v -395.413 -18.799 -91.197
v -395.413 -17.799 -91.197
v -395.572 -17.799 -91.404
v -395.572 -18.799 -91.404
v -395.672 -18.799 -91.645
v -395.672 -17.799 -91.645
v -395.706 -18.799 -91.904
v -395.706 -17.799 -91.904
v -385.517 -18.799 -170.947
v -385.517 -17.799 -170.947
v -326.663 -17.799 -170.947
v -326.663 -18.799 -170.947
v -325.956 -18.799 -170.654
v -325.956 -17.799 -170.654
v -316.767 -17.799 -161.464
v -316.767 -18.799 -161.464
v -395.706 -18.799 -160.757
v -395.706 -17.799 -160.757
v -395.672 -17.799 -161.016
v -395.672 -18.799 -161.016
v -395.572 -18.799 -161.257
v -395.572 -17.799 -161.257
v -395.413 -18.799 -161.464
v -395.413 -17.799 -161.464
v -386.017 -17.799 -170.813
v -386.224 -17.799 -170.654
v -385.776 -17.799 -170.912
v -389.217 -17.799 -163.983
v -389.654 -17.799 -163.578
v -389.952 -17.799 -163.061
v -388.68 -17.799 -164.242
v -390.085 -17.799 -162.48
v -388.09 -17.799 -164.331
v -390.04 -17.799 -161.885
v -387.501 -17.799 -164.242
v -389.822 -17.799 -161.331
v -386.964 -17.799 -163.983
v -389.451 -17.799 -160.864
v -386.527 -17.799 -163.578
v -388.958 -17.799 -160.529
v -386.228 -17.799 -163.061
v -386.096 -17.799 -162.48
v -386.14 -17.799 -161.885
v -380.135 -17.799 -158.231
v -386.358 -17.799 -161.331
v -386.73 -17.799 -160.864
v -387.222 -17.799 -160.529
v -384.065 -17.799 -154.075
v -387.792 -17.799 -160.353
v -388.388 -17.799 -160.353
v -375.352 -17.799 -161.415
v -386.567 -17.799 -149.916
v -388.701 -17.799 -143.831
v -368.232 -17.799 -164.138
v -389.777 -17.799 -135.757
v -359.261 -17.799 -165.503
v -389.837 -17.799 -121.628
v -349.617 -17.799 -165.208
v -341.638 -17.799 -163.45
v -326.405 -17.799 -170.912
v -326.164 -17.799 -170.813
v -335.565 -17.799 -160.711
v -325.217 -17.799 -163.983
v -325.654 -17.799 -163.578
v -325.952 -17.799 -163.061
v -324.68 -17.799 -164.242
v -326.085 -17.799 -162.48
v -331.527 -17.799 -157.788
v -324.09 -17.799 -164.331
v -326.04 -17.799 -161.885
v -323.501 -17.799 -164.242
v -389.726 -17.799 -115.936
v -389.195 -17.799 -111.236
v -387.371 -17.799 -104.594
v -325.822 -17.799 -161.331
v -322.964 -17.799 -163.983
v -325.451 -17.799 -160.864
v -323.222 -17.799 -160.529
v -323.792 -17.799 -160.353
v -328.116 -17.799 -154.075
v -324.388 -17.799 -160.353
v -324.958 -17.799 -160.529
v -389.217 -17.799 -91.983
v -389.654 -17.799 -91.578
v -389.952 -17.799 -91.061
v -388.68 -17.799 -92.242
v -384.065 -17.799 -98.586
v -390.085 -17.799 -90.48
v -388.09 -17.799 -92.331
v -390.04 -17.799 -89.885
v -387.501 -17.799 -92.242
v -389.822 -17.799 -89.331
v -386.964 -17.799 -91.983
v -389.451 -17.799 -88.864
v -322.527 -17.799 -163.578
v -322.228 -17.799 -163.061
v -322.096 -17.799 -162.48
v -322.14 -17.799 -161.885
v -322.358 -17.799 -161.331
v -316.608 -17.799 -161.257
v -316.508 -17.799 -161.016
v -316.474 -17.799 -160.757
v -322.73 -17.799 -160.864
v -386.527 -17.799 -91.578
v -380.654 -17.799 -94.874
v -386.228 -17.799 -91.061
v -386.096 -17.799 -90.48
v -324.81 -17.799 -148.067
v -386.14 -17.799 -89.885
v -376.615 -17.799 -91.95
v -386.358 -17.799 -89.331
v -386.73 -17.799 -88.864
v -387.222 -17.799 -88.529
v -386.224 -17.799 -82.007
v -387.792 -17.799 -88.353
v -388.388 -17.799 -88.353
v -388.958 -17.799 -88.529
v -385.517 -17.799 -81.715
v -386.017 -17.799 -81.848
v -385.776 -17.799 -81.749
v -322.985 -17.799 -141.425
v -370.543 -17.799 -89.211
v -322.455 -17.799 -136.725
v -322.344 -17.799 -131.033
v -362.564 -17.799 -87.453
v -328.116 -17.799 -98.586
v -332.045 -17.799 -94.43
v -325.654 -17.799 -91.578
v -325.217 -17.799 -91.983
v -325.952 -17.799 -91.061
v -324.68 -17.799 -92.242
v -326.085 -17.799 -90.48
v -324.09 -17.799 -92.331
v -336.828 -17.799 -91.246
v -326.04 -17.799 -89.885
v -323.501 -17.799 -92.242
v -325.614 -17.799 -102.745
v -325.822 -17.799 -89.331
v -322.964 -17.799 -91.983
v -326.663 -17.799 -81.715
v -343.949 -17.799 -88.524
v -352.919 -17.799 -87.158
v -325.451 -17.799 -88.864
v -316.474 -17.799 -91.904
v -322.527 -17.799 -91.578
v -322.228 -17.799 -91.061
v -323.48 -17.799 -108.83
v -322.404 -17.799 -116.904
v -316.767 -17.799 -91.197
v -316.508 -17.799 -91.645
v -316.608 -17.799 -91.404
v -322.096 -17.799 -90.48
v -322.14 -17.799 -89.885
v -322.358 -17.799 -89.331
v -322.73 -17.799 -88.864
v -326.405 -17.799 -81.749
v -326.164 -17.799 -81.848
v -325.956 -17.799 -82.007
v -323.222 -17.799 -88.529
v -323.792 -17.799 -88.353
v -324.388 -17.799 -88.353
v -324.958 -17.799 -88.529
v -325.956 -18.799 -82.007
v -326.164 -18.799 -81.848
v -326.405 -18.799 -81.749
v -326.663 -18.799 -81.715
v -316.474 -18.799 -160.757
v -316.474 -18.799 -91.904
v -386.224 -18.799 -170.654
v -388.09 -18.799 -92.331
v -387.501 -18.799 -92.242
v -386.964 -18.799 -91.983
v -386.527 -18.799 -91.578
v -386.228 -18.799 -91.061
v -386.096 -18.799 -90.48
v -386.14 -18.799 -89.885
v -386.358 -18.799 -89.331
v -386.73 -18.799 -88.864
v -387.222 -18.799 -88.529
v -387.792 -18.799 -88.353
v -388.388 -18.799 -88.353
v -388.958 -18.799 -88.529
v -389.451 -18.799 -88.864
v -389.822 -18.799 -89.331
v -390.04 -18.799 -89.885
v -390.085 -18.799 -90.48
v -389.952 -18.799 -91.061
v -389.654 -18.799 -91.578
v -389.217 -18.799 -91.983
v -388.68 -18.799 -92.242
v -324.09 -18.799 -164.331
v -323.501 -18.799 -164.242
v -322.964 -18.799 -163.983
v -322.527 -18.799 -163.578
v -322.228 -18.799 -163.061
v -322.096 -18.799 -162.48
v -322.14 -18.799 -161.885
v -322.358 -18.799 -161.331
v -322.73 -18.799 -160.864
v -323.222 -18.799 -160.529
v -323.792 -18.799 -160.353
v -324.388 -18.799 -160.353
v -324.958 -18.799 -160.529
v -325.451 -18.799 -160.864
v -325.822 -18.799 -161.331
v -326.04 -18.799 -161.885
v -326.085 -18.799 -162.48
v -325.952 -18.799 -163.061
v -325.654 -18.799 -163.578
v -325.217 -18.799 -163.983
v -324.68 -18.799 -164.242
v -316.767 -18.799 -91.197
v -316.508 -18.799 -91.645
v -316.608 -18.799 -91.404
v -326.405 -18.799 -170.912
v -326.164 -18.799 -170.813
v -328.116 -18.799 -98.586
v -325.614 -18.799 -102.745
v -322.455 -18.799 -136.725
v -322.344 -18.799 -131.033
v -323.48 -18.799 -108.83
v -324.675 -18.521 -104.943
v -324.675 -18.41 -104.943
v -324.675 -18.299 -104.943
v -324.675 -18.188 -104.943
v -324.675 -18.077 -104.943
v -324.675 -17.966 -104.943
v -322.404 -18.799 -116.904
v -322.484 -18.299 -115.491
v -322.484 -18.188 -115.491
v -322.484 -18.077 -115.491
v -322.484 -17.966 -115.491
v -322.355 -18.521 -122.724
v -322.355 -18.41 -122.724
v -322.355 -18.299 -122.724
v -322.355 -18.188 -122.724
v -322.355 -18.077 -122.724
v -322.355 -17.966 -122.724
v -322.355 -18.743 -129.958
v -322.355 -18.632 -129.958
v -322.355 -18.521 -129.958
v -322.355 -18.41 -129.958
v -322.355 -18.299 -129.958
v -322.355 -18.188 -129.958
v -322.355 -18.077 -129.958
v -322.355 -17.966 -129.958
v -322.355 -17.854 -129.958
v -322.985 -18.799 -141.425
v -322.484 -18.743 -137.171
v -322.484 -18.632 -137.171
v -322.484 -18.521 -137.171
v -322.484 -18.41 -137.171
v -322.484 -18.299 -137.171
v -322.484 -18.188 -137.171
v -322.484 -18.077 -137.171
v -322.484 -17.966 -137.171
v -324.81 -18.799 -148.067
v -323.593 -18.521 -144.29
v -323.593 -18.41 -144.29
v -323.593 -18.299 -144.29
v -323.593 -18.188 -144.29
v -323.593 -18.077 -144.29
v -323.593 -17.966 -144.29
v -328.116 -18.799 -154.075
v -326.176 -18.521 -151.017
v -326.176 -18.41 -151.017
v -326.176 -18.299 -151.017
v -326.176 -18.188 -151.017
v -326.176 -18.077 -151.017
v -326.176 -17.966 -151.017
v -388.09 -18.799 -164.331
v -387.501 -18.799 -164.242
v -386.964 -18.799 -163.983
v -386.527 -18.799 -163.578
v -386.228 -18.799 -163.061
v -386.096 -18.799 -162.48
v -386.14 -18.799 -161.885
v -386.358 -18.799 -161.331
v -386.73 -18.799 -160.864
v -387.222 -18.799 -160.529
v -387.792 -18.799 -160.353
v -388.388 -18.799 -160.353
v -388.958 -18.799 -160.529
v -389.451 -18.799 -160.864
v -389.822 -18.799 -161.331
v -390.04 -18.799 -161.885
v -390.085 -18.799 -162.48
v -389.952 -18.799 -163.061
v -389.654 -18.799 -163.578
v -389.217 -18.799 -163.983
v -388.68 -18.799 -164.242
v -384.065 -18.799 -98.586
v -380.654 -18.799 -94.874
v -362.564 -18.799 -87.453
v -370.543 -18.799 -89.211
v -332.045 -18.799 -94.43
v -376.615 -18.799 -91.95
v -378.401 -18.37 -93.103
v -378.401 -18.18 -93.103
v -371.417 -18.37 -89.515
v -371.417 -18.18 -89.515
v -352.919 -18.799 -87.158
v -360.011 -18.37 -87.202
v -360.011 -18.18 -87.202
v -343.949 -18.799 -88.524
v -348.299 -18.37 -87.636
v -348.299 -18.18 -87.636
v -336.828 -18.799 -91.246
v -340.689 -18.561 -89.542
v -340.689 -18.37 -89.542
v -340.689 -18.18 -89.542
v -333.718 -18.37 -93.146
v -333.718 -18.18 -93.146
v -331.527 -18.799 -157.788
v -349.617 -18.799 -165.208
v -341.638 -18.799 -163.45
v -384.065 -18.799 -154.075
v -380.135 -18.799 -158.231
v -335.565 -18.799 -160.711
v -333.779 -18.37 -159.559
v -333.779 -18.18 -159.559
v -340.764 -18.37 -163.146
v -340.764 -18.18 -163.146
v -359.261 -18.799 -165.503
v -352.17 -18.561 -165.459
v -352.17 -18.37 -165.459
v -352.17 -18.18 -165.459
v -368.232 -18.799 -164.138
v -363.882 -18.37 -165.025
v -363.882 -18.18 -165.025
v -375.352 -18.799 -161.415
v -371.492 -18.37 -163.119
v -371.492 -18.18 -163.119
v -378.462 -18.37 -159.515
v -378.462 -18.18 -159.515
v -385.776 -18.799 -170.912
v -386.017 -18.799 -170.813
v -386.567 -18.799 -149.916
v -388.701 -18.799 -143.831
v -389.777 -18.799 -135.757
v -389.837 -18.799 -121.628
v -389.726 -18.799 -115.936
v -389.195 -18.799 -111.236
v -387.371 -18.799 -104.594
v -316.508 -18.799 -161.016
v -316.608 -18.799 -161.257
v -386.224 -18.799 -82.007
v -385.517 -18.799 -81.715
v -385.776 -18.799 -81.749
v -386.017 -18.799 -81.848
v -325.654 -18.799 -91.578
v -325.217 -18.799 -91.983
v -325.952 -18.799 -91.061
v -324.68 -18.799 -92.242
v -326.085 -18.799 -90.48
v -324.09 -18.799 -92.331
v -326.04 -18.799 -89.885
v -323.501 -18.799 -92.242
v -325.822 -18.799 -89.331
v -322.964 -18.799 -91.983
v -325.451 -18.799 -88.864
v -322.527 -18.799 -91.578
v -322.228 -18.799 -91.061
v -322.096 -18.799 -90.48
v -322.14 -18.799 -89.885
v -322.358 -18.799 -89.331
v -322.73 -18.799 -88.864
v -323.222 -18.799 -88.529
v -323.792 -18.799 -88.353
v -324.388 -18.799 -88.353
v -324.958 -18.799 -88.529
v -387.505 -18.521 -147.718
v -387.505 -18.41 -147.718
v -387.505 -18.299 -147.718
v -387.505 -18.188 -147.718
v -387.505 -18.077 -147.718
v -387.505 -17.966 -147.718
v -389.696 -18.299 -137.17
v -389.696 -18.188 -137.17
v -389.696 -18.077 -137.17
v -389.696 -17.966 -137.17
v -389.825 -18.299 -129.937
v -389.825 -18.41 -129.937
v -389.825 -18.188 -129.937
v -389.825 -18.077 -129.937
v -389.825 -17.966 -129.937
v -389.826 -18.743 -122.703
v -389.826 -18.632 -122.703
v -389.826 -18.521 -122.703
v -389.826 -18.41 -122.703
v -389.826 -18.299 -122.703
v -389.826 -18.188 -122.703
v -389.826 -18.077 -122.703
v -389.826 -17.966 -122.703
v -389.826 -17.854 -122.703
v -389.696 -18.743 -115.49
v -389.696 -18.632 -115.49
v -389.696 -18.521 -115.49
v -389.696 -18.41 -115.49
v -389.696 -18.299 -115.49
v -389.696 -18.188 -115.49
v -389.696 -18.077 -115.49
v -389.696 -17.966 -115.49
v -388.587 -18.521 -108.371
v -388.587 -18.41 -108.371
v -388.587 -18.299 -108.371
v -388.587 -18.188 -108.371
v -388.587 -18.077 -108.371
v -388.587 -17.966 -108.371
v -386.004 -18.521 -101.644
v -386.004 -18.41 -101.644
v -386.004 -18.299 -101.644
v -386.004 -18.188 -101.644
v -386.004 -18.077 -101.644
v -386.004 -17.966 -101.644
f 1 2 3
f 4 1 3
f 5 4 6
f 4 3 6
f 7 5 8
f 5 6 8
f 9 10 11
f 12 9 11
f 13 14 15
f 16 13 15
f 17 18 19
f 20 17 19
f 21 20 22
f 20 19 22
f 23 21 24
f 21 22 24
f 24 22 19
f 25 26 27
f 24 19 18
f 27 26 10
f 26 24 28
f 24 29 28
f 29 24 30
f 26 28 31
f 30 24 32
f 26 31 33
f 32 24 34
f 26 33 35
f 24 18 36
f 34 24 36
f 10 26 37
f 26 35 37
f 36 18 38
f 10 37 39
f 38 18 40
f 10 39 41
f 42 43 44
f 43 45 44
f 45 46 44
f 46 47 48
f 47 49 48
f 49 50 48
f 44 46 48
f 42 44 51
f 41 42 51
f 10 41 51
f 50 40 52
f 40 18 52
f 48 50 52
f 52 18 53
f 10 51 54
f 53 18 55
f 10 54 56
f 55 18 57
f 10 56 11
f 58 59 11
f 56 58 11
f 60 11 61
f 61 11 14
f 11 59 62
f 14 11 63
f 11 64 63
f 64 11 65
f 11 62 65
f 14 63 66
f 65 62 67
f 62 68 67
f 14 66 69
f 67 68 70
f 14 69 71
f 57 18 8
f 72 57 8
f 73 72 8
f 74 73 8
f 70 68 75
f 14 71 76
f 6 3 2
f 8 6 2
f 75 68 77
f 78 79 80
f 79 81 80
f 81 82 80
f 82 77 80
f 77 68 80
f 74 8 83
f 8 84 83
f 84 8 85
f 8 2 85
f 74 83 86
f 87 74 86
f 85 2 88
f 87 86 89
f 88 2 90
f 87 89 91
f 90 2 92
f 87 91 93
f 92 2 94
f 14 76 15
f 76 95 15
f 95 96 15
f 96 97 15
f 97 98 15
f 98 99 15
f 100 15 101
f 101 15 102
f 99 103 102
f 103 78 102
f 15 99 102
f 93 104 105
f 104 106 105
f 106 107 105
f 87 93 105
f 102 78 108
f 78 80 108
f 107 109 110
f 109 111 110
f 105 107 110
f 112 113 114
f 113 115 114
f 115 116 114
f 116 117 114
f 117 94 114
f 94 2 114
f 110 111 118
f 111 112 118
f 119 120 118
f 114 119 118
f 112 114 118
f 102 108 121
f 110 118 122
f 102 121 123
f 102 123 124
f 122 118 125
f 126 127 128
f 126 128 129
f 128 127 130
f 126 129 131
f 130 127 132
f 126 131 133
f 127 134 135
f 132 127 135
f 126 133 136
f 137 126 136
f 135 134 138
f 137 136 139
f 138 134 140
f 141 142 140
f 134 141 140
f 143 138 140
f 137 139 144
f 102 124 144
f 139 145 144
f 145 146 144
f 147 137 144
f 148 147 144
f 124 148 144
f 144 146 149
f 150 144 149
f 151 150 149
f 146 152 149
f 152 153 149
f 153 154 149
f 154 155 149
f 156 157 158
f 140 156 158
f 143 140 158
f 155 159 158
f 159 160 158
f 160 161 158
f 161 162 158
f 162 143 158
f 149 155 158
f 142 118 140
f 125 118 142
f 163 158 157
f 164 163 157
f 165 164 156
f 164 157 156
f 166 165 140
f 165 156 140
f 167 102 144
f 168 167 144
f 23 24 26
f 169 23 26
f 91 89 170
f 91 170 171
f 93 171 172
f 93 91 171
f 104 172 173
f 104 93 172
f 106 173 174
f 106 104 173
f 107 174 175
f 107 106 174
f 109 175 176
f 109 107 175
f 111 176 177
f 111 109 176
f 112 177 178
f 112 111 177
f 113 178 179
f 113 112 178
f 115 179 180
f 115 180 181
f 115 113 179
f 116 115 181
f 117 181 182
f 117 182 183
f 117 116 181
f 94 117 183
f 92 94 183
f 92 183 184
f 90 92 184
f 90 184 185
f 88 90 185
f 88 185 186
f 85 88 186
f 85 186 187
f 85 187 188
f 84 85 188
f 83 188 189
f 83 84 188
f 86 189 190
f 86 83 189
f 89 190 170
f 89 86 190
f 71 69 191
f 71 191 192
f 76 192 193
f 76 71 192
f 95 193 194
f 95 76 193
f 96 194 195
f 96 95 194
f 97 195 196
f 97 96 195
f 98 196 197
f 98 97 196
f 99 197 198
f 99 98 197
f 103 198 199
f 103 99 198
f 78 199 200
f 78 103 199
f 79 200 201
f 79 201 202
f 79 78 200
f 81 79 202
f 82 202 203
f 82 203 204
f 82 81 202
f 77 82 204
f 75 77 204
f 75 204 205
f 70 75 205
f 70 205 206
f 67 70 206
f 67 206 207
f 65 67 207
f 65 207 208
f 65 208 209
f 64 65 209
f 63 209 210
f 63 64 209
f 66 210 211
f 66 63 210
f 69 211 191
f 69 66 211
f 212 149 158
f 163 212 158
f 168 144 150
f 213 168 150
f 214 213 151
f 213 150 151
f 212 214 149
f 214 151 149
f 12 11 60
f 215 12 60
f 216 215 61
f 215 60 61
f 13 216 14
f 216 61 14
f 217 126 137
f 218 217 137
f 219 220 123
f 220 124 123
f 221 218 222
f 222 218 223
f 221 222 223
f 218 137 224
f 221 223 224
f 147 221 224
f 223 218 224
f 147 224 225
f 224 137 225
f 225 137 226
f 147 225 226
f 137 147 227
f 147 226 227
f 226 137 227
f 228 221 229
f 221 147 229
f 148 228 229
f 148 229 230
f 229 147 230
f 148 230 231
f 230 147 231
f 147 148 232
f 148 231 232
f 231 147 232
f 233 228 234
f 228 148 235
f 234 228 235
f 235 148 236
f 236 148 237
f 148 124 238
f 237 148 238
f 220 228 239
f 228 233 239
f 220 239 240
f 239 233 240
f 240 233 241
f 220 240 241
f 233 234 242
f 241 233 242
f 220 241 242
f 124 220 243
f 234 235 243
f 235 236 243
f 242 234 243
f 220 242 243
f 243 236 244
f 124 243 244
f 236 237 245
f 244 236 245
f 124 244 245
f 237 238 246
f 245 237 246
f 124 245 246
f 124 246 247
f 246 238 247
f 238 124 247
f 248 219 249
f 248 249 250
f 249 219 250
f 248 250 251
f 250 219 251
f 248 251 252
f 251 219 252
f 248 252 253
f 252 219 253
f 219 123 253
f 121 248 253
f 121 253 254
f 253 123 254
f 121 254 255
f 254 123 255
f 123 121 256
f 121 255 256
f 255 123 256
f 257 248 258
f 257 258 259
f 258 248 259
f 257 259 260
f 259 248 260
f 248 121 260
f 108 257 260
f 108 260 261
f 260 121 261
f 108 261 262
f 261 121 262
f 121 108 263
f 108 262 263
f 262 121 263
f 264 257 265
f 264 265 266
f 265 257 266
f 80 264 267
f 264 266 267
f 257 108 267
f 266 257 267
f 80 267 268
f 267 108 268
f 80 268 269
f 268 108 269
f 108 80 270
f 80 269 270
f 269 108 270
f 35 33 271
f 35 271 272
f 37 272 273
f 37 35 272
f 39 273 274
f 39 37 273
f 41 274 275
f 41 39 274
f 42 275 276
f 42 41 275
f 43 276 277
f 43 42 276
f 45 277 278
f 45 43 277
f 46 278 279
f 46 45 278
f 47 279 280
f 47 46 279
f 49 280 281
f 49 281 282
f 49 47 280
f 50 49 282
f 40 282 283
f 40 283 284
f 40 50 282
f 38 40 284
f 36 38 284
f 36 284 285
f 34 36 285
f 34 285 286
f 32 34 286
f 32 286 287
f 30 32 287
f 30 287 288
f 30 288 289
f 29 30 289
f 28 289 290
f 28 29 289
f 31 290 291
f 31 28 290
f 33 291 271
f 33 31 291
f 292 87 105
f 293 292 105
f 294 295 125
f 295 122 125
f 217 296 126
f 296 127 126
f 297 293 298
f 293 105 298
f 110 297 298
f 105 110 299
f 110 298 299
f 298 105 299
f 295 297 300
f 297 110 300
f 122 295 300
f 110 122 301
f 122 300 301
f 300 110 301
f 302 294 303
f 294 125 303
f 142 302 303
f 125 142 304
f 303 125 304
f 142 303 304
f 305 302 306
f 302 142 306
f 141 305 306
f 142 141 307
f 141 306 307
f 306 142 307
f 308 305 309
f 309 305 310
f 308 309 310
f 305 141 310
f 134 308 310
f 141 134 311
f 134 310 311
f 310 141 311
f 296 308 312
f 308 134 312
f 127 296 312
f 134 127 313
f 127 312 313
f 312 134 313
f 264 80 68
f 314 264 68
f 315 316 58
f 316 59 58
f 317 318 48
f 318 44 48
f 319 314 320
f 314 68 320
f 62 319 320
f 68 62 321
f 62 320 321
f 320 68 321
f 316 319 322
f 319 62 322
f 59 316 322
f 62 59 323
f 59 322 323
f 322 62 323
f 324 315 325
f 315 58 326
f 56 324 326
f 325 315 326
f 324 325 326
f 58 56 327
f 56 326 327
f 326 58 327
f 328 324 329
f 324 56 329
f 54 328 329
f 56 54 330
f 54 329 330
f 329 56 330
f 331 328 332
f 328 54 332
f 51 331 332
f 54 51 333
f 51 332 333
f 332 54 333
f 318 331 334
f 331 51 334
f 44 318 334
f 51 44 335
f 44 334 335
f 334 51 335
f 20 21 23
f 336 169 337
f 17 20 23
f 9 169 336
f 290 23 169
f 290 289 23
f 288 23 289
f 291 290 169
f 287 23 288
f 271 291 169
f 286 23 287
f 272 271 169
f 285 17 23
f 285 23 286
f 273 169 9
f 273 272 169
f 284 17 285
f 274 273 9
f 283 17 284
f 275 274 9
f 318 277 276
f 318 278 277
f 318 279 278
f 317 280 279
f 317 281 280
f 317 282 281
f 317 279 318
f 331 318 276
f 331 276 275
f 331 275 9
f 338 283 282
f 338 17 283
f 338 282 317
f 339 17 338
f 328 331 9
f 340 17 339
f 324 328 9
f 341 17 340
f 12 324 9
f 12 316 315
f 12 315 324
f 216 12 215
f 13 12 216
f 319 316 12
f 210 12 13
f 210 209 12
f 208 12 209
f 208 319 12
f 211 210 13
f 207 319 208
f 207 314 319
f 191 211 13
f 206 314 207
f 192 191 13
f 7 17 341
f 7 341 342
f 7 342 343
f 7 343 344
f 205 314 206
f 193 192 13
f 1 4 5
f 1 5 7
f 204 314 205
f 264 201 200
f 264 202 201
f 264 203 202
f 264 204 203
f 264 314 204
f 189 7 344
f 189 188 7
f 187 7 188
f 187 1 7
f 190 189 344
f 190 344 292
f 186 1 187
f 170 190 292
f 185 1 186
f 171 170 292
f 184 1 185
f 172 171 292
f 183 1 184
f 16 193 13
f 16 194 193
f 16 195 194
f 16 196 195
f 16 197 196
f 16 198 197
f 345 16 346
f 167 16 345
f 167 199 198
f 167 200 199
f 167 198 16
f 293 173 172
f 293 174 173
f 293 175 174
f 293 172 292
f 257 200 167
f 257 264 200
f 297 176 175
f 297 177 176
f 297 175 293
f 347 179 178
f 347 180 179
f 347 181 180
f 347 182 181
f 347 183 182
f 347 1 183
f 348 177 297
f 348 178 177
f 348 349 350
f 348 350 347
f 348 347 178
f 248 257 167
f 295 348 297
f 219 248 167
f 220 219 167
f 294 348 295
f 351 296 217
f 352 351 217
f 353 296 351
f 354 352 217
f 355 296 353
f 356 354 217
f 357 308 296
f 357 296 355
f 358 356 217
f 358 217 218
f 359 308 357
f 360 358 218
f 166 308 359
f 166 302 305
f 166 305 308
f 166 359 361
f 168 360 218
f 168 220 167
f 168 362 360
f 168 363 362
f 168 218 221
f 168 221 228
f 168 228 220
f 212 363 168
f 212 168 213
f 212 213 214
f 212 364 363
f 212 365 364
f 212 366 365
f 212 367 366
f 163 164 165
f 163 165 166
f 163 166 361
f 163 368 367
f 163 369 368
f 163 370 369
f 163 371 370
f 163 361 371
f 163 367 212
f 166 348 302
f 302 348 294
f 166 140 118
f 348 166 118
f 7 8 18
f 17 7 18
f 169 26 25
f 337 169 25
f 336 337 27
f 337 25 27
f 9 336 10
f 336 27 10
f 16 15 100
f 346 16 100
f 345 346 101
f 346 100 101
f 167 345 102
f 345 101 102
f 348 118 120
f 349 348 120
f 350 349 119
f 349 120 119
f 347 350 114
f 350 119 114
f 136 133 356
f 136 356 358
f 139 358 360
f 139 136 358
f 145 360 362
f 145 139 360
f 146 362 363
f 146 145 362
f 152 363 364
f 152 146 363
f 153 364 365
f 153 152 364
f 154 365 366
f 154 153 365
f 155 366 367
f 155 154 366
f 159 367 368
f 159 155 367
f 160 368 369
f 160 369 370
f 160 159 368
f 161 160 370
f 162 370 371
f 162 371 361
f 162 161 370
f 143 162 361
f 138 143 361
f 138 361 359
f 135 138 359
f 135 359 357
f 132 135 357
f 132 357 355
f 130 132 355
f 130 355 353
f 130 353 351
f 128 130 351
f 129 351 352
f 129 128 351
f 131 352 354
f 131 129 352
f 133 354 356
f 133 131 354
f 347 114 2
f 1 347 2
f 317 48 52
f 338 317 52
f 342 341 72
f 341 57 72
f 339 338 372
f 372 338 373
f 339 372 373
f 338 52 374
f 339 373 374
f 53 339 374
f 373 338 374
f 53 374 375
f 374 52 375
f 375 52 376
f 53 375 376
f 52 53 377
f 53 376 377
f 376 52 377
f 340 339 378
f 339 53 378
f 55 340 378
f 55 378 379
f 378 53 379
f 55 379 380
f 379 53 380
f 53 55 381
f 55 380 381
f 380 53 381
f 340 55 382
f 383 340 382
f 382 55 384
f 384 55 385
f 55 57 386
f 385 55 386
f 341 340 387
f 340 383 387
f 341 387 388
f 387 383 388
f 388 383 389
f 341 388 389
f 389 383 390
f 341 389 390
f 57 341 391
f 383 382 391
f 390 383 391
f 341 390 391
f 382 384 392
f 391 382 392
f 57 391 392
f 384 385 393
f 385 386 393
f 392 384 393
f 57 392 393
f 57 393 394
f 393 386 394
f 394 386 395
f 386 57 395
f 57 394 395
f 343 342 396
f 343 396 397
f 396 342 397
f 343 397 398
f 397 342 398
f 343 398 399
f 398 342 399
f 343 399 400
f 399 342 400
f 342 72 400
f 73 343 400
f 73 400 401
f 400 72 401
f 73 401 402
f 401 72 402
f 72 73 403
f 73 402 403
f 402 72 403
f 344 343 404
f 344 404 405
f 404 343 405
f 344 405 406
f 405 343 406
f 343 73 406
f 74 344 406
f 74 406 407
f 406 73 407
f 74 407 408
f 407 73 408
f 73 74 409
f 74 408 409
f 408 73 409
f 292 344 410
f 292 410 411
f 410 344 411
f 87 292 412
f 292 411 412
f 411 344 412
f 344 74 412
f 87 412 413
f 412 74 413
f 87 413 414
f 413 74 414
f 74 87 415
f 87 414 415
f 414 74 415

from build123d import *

# Parameters (mm, degrees)
SKETCH_1_R      = 2
EXTRUDE_1_DEPTH = 1


with BuildPart() as part:
    # 草图1 → 凸台-拉伸1 (new body)
    with BuildSketch(Plane.XZ.offset(17.798874667)):
        with BuildLine():
            Line((-395.706204946, -91.903738718), (-395.706204946, -160.757312284))
            ThreePointArc((-395.706204946, -160.757312284), (-395.630097027, -161.139937827), (-395.413356336, -161.464311369))
            Line((-395.413356336, -161.464311369), (-386.224002242, -170.653665463))
            ThreePointArc((-386.224002242, -170.653665463), (-385.8996287, -170.870406154), (-385.517003157, -170.946514073))
            Line((-385.517003157, -170.946514073), (-326.663429591, -170.946514073))
            ThreePointArc((-326.663429591, -170.946514073), (-326.280804048, -170.870406154), (-325.956430506, -170.653665463))
            Line((-325.956430506, -170.653665463), (-316.767076412, -161.464311369))
            ThreePointArc((-316.767076412, -161.464311369), (-316.550335721, -161.139937827), (-316.474227802, -160.757312284))
            Line((-316.474227802, -160.757312284), (-316.474227802, -91.903738718))
            ThreePointArc((-316.474227802, -91.903738718), (-316.550335721, -91.521113175), (-316.767076412, -91.196739633))
            Line((-316.767076412, -91.196739633), (-325.956430506, -82.007385539))
            ThreePointArc((-325.956430506, -82.007385539), (-326.280804048, -81.790644848), (-326.663429591, -81.714536929))
            Line((-326.663429591, -81.714536929), (-385.517003157, -81.714536929))
            ThreePointArc((-385.517003157, -81.714536929), (-385.8996287, -81.790644848), (-386.224002242, -82.007385539))
            Line((-386.224002242, -82.007385539), (-395.413356336, -91.196739633))
            ThreePointArc((-395.413356336, -91.196739633), (-395.630097027, -91.521113175), (-395.706204946, -91.903738718))
        make_face()
        with Locations(Location((-388.090216374, -90.330525501, 0), (0, 0, 270))):
            Circle(SKETCH_1_R, mode=Mode.SUBTRACT)
        with Locations(Location((-324.090216374, -90.330525501, 0), (0, 0, 270))):
            Circle(SKETCH_1_R, mode=Mode.SUBTRACT)
        with Locations(Location((-324.090216374, -162.330525501, 0), (0, 0, 270))):
            Circle(SKETCH_1_R, mode=Mode.SUBTRACT)
        with Locations(Location((-388.090216374, -162.330525501, 0), (0, 0, 270))):
            Circle(SKETCH_1_R, mode=Mode.SUBTRACT)
        with BuildLine():
            add(Edge.make_bspline(
                [(-328.115549043, -154.074705918), (-328.521110277, -154.59950882), (-328.935951097, -155.116186146), (-329.806169809, -156.114044907), (-330.260453195, -156.596991611), (-331.213350311, -157.520739064), (-331.707900164, -157.955834459), (-332.723346196, -158.787049549), (-333.244315955, -159.183060394), (-334.848936349, -160.309387169), (-335.972388004, -160.980823062), (-337.731348119, -161.87882583), (-338.332266211, -162.161075436), (-339.54151706, -162.683417257), (-340.150623092, -162.924120409), (-343.216470166, -164.034826977), (-345.733148117, -164.631034044), (-349.574949627, -165.220267596), (-350.866884926, -165.364900576), (-353.472874642, -165.553124722), (-354.790025345, -165.596406642), (-358.712924122, -165.592375715), (-361.308871291, -165.414172312), (-365.167942823, -164.830251401), (-366.448430665, -164.582286392), (-368.358111819, -164.109940734), (-368.99453183, -163.935229374), (-370.254220123, -163.552000312), (-370.876741702, -163.343828387), (-372.721697987, -162.668191611), (-373.921848978, -162.150340028), (-375.669495279, -161.254671187), (-376.243225263, -160.936174353), (-377.371642786, -160.256122939), (-377.926429949, -159.894182142), (-378.998067992, -159.136743168), (-379.517159279, -158.739902065), (-380.523601029, -157.91183415), (-381.01071538, -157.480351552), (-381.943283382, -156.572254171), (-382.389831683, -156.096825252), (-383.249518774, -155.109773972), (-383.661413356, -154.596803725), (-384.064883145, -154.074706668)],
                knots=[0, 0, 0, 0, 0.03125, 0.03125, 0.0625, 0.0625, 0.09375, 0.09375, 0.125, 0.125, 0.1875, 0.1875, 0.21875, 0.21875, 0.25, 0.25, 0.375, 0.375, 0.4375, 0.4375, 0.5, 0.5, 0.625, 0.625, 0.6875, 0.6875, 0.71875, 0.71875, 0.75, 0.75, 0.8125, 0.8125, 0.84375, 0.84375, 0.875, 0.875, 0.90625, 0.90625, 0.9375, 0.9375, 0.96875, 0.96875, 1, 1, 1, 1], degree=3))
            add(Edge.make_bspline(
                [(-384.064883145, -154.074706668), (-384.765407707, -153.0864132), (-385.42732094, -152.076153161), (-386.292484546, -150.488109085), (-386.559459675, -149.946579027), (-387.059276771, -148.844100038), (-387.291729743, -148.282508818), (-388.359546252, -145.46132493), (-388.939276666, -143.138851633), (-389.482665418, -139.577278966), (-389.611388551, -138.374314162), (-389.781266573, -135.965239718), (-389.822006502, -134.76010621), (-389.851460561, -132.349137318), (-389.839404608, -131.143291545), (-389.811274153, -128.731545786), (-389.79638992, -127.525661857), (-389.796563394, -125.114297943), (-389.811529784, -123.908816727), (-389.839623007, -121.497829476), (-389.851459361, -120.292359943), (-389.821592912, -117.886702654), (-389.780638177, -116.686362914), (-389.611853133, -114.293992905), (-389.484842639, -113.101884222), (-389.123813463, -110.727901972), (-388.888904034, -109.546113603), (-388.436003689, -107.783047131), (-388.268720755, -107.197789125), (-387.904764869, -106.045116113), (-387.707679153, -105.475910785), (-387.281297017, -104.352704238), (-387.051446913, -103.79896437), (-386.556282004, -102.708224696), (-386.291397985, -102.171021551), (-385.430552687, -100.590656677), (-384.768336475, -99.578768629), (-384.064883703, -98.58634508)],
                knots=[0, 0, 0, 0, 0.0625, 0.0625, 0.09375, 0.09375, 0.125, 0.125, 0.25, 0.25, 0.3125, 0.3125, 0.375, 0.375, 0.4375, 0.4375, 0.5, 0.5, 0.5625, 0.5625, 0.625, 0.625, 0.6875, 0.6875, 0.75, 0.75, 0.8125, 0.8125, 0.84375, 0.84375, 0.875, 0.875, 0.90625, 0.90625, 0.9375, 0.9375, 1, 1, 1, 1], degree=3))
            add(Edge.make_bspline(
                [(-384.064883703, -98.58634508), (-383.659322468, -98.061542177), (-383.244481649, -97.544864852), (-382.374262935, -96.547006091), (-381.91997955, -96.064059387), (-380.967082434, -95.140311933), (-380.47253258, -94.705216539), (-379.457086548, -93.874001449), (-378.93611679, -93.477990604), (-377.331496396, -92.35166383), (-376.208044739, -91.680227937), (-374.449084625, -90.782225169), (-373.848166533, -90.499975563), (-372.638915684, -89.977633743), (-372.029809651, -89.73693059), (-368.963962577, -88.626224023), (-366.447284626, -88.030016957), (-362.605483116, -87.440783404), (-361.313547818, -87.296150424), (-358.707558102, -87.107926278), (-357.390407398, -87.064644358), (-353.467508621, -87.068675286), (-350.871561452, -87.24687869), (-347.01248992, -87.830799602), (-345.732002079, -88.078764611), (-343.822320925, -88.55111027), (-343.185900913, -88.72582163), (-341.92621262, -89.109050692), (-341.303691042, -89.317222617), (-339.458734756, -89.992859393), (-338.258583765, -90.510710976), (-336.510937465, -91.406379817), (-335.937207481, -91.724876651), (-334.808789958, -92.404928066), (-334.254002795, -92.766868862), (-333.182364752, -93.524307837), (-332.663273465, -93.92114894), (-331.656831716, -94.749216855), (-331.169717364, -95.180699453), (-330.237149362, -96.088796835), (-329.790601062, -96.564225753), (-328.930913971, -97.551277033), (-328.519019389, -98.064247281), (-328.1155496, -98.586344338)],
                knots=[0, 0, 0, 0, 0.03125, 0.03125, 0.0625, 0.0625, 0.09375, 0.09375, 0.125, 0.125, 0.1875, 0.1875, 0.21875, 0.21875, 0.25, 0.25, 0.375, 0.375, 0.4375, 0.4375, 0.5, 0.5, 0.625, 0.625, 0.6875, 0.6875, 0.71875, 0.71875, 0.75, 0.75, 0.8125, 0.8125, 0.84375, 0.84375, 0.875, 0.875, 0.90625, 0.90625, 0.9375, 0.9375, 0.96875, 0.96875, 1, 1, 1, 1], degree=3))
            add(Edge.make_bspline(
                [(-328.1155496, -98.586344338), (-327.415025038, -99.574637805), (-326.753111806, -100.584897844), (-325.8879482, -102.17294192), (-325.620973071, -102.714471978), (-325.121155975, -103.816950967), (-324.888703004, -104.378542187), (-323.820886495, -107.199726075), (-323.241156082, -109.522199372), (-322.69776733, -113.083772038), (-322.569044197, -114.286736841), (-322.399166175, -116.695811285), (-322.358426246, -117.900944793), (-322.328972188, -120.311913685), (-322.341028142, -121.517759457), (-322.369158597, -123.929505216), (-322.38404283, -125.135389145), (-322.383869357, -127.546753058), (-322.368902966, -128.752234275), (-322.340809743, -131.163221525), (-322.328973388, -132.368691057), (-322.358839836, -134.774348346), (-322.399794572, -135.974688086), (-322.568579615, -138.367058095), (-322.695590109, -139.559166777), (-323.056619285, -141.933149027), (-323.291528714, -143.114937396), (-323.744429058, -144.878003867), (-323.911711993, -145.463261874), (-324.275667878, -146.615934885), (-324.472753594, -147.185140214), (-324.899135729, -148.30834676), (-325.128985833, -148.862086628), (-325.624150742, -149.952826302), (-325.889034762, -150.490029447), (-326.74988006, -152.07039432), (-327.412096271, -153.082282368), (-328.115549043, -154.074705918)],
                knots=[0, 0, 0, 0, 0.0625, 0.0625, 0.09375, 0.09375, 0.125, 0.125, 0.25, 0.25, 0.3125, 0.3125, 0.375, 0.375, 0.4375, 0.4375, 0.5, 0.5, 0.5625, 0.5625, 0.625, 0.625, 0.6875, 0.6875, 0.75, 0.75, 0.8125, 0.8125, 0.84375, 0.84375, 0.875, 0.875, 0.90625, 0.90625, 0.9375, 0.9375, 1, 1, 1, 1], degree=3))
        make_face(mode=Mode.SUBTRACT)
    extrude(amount=EXTRUDE_1_DEPTH)


solid = part.part
